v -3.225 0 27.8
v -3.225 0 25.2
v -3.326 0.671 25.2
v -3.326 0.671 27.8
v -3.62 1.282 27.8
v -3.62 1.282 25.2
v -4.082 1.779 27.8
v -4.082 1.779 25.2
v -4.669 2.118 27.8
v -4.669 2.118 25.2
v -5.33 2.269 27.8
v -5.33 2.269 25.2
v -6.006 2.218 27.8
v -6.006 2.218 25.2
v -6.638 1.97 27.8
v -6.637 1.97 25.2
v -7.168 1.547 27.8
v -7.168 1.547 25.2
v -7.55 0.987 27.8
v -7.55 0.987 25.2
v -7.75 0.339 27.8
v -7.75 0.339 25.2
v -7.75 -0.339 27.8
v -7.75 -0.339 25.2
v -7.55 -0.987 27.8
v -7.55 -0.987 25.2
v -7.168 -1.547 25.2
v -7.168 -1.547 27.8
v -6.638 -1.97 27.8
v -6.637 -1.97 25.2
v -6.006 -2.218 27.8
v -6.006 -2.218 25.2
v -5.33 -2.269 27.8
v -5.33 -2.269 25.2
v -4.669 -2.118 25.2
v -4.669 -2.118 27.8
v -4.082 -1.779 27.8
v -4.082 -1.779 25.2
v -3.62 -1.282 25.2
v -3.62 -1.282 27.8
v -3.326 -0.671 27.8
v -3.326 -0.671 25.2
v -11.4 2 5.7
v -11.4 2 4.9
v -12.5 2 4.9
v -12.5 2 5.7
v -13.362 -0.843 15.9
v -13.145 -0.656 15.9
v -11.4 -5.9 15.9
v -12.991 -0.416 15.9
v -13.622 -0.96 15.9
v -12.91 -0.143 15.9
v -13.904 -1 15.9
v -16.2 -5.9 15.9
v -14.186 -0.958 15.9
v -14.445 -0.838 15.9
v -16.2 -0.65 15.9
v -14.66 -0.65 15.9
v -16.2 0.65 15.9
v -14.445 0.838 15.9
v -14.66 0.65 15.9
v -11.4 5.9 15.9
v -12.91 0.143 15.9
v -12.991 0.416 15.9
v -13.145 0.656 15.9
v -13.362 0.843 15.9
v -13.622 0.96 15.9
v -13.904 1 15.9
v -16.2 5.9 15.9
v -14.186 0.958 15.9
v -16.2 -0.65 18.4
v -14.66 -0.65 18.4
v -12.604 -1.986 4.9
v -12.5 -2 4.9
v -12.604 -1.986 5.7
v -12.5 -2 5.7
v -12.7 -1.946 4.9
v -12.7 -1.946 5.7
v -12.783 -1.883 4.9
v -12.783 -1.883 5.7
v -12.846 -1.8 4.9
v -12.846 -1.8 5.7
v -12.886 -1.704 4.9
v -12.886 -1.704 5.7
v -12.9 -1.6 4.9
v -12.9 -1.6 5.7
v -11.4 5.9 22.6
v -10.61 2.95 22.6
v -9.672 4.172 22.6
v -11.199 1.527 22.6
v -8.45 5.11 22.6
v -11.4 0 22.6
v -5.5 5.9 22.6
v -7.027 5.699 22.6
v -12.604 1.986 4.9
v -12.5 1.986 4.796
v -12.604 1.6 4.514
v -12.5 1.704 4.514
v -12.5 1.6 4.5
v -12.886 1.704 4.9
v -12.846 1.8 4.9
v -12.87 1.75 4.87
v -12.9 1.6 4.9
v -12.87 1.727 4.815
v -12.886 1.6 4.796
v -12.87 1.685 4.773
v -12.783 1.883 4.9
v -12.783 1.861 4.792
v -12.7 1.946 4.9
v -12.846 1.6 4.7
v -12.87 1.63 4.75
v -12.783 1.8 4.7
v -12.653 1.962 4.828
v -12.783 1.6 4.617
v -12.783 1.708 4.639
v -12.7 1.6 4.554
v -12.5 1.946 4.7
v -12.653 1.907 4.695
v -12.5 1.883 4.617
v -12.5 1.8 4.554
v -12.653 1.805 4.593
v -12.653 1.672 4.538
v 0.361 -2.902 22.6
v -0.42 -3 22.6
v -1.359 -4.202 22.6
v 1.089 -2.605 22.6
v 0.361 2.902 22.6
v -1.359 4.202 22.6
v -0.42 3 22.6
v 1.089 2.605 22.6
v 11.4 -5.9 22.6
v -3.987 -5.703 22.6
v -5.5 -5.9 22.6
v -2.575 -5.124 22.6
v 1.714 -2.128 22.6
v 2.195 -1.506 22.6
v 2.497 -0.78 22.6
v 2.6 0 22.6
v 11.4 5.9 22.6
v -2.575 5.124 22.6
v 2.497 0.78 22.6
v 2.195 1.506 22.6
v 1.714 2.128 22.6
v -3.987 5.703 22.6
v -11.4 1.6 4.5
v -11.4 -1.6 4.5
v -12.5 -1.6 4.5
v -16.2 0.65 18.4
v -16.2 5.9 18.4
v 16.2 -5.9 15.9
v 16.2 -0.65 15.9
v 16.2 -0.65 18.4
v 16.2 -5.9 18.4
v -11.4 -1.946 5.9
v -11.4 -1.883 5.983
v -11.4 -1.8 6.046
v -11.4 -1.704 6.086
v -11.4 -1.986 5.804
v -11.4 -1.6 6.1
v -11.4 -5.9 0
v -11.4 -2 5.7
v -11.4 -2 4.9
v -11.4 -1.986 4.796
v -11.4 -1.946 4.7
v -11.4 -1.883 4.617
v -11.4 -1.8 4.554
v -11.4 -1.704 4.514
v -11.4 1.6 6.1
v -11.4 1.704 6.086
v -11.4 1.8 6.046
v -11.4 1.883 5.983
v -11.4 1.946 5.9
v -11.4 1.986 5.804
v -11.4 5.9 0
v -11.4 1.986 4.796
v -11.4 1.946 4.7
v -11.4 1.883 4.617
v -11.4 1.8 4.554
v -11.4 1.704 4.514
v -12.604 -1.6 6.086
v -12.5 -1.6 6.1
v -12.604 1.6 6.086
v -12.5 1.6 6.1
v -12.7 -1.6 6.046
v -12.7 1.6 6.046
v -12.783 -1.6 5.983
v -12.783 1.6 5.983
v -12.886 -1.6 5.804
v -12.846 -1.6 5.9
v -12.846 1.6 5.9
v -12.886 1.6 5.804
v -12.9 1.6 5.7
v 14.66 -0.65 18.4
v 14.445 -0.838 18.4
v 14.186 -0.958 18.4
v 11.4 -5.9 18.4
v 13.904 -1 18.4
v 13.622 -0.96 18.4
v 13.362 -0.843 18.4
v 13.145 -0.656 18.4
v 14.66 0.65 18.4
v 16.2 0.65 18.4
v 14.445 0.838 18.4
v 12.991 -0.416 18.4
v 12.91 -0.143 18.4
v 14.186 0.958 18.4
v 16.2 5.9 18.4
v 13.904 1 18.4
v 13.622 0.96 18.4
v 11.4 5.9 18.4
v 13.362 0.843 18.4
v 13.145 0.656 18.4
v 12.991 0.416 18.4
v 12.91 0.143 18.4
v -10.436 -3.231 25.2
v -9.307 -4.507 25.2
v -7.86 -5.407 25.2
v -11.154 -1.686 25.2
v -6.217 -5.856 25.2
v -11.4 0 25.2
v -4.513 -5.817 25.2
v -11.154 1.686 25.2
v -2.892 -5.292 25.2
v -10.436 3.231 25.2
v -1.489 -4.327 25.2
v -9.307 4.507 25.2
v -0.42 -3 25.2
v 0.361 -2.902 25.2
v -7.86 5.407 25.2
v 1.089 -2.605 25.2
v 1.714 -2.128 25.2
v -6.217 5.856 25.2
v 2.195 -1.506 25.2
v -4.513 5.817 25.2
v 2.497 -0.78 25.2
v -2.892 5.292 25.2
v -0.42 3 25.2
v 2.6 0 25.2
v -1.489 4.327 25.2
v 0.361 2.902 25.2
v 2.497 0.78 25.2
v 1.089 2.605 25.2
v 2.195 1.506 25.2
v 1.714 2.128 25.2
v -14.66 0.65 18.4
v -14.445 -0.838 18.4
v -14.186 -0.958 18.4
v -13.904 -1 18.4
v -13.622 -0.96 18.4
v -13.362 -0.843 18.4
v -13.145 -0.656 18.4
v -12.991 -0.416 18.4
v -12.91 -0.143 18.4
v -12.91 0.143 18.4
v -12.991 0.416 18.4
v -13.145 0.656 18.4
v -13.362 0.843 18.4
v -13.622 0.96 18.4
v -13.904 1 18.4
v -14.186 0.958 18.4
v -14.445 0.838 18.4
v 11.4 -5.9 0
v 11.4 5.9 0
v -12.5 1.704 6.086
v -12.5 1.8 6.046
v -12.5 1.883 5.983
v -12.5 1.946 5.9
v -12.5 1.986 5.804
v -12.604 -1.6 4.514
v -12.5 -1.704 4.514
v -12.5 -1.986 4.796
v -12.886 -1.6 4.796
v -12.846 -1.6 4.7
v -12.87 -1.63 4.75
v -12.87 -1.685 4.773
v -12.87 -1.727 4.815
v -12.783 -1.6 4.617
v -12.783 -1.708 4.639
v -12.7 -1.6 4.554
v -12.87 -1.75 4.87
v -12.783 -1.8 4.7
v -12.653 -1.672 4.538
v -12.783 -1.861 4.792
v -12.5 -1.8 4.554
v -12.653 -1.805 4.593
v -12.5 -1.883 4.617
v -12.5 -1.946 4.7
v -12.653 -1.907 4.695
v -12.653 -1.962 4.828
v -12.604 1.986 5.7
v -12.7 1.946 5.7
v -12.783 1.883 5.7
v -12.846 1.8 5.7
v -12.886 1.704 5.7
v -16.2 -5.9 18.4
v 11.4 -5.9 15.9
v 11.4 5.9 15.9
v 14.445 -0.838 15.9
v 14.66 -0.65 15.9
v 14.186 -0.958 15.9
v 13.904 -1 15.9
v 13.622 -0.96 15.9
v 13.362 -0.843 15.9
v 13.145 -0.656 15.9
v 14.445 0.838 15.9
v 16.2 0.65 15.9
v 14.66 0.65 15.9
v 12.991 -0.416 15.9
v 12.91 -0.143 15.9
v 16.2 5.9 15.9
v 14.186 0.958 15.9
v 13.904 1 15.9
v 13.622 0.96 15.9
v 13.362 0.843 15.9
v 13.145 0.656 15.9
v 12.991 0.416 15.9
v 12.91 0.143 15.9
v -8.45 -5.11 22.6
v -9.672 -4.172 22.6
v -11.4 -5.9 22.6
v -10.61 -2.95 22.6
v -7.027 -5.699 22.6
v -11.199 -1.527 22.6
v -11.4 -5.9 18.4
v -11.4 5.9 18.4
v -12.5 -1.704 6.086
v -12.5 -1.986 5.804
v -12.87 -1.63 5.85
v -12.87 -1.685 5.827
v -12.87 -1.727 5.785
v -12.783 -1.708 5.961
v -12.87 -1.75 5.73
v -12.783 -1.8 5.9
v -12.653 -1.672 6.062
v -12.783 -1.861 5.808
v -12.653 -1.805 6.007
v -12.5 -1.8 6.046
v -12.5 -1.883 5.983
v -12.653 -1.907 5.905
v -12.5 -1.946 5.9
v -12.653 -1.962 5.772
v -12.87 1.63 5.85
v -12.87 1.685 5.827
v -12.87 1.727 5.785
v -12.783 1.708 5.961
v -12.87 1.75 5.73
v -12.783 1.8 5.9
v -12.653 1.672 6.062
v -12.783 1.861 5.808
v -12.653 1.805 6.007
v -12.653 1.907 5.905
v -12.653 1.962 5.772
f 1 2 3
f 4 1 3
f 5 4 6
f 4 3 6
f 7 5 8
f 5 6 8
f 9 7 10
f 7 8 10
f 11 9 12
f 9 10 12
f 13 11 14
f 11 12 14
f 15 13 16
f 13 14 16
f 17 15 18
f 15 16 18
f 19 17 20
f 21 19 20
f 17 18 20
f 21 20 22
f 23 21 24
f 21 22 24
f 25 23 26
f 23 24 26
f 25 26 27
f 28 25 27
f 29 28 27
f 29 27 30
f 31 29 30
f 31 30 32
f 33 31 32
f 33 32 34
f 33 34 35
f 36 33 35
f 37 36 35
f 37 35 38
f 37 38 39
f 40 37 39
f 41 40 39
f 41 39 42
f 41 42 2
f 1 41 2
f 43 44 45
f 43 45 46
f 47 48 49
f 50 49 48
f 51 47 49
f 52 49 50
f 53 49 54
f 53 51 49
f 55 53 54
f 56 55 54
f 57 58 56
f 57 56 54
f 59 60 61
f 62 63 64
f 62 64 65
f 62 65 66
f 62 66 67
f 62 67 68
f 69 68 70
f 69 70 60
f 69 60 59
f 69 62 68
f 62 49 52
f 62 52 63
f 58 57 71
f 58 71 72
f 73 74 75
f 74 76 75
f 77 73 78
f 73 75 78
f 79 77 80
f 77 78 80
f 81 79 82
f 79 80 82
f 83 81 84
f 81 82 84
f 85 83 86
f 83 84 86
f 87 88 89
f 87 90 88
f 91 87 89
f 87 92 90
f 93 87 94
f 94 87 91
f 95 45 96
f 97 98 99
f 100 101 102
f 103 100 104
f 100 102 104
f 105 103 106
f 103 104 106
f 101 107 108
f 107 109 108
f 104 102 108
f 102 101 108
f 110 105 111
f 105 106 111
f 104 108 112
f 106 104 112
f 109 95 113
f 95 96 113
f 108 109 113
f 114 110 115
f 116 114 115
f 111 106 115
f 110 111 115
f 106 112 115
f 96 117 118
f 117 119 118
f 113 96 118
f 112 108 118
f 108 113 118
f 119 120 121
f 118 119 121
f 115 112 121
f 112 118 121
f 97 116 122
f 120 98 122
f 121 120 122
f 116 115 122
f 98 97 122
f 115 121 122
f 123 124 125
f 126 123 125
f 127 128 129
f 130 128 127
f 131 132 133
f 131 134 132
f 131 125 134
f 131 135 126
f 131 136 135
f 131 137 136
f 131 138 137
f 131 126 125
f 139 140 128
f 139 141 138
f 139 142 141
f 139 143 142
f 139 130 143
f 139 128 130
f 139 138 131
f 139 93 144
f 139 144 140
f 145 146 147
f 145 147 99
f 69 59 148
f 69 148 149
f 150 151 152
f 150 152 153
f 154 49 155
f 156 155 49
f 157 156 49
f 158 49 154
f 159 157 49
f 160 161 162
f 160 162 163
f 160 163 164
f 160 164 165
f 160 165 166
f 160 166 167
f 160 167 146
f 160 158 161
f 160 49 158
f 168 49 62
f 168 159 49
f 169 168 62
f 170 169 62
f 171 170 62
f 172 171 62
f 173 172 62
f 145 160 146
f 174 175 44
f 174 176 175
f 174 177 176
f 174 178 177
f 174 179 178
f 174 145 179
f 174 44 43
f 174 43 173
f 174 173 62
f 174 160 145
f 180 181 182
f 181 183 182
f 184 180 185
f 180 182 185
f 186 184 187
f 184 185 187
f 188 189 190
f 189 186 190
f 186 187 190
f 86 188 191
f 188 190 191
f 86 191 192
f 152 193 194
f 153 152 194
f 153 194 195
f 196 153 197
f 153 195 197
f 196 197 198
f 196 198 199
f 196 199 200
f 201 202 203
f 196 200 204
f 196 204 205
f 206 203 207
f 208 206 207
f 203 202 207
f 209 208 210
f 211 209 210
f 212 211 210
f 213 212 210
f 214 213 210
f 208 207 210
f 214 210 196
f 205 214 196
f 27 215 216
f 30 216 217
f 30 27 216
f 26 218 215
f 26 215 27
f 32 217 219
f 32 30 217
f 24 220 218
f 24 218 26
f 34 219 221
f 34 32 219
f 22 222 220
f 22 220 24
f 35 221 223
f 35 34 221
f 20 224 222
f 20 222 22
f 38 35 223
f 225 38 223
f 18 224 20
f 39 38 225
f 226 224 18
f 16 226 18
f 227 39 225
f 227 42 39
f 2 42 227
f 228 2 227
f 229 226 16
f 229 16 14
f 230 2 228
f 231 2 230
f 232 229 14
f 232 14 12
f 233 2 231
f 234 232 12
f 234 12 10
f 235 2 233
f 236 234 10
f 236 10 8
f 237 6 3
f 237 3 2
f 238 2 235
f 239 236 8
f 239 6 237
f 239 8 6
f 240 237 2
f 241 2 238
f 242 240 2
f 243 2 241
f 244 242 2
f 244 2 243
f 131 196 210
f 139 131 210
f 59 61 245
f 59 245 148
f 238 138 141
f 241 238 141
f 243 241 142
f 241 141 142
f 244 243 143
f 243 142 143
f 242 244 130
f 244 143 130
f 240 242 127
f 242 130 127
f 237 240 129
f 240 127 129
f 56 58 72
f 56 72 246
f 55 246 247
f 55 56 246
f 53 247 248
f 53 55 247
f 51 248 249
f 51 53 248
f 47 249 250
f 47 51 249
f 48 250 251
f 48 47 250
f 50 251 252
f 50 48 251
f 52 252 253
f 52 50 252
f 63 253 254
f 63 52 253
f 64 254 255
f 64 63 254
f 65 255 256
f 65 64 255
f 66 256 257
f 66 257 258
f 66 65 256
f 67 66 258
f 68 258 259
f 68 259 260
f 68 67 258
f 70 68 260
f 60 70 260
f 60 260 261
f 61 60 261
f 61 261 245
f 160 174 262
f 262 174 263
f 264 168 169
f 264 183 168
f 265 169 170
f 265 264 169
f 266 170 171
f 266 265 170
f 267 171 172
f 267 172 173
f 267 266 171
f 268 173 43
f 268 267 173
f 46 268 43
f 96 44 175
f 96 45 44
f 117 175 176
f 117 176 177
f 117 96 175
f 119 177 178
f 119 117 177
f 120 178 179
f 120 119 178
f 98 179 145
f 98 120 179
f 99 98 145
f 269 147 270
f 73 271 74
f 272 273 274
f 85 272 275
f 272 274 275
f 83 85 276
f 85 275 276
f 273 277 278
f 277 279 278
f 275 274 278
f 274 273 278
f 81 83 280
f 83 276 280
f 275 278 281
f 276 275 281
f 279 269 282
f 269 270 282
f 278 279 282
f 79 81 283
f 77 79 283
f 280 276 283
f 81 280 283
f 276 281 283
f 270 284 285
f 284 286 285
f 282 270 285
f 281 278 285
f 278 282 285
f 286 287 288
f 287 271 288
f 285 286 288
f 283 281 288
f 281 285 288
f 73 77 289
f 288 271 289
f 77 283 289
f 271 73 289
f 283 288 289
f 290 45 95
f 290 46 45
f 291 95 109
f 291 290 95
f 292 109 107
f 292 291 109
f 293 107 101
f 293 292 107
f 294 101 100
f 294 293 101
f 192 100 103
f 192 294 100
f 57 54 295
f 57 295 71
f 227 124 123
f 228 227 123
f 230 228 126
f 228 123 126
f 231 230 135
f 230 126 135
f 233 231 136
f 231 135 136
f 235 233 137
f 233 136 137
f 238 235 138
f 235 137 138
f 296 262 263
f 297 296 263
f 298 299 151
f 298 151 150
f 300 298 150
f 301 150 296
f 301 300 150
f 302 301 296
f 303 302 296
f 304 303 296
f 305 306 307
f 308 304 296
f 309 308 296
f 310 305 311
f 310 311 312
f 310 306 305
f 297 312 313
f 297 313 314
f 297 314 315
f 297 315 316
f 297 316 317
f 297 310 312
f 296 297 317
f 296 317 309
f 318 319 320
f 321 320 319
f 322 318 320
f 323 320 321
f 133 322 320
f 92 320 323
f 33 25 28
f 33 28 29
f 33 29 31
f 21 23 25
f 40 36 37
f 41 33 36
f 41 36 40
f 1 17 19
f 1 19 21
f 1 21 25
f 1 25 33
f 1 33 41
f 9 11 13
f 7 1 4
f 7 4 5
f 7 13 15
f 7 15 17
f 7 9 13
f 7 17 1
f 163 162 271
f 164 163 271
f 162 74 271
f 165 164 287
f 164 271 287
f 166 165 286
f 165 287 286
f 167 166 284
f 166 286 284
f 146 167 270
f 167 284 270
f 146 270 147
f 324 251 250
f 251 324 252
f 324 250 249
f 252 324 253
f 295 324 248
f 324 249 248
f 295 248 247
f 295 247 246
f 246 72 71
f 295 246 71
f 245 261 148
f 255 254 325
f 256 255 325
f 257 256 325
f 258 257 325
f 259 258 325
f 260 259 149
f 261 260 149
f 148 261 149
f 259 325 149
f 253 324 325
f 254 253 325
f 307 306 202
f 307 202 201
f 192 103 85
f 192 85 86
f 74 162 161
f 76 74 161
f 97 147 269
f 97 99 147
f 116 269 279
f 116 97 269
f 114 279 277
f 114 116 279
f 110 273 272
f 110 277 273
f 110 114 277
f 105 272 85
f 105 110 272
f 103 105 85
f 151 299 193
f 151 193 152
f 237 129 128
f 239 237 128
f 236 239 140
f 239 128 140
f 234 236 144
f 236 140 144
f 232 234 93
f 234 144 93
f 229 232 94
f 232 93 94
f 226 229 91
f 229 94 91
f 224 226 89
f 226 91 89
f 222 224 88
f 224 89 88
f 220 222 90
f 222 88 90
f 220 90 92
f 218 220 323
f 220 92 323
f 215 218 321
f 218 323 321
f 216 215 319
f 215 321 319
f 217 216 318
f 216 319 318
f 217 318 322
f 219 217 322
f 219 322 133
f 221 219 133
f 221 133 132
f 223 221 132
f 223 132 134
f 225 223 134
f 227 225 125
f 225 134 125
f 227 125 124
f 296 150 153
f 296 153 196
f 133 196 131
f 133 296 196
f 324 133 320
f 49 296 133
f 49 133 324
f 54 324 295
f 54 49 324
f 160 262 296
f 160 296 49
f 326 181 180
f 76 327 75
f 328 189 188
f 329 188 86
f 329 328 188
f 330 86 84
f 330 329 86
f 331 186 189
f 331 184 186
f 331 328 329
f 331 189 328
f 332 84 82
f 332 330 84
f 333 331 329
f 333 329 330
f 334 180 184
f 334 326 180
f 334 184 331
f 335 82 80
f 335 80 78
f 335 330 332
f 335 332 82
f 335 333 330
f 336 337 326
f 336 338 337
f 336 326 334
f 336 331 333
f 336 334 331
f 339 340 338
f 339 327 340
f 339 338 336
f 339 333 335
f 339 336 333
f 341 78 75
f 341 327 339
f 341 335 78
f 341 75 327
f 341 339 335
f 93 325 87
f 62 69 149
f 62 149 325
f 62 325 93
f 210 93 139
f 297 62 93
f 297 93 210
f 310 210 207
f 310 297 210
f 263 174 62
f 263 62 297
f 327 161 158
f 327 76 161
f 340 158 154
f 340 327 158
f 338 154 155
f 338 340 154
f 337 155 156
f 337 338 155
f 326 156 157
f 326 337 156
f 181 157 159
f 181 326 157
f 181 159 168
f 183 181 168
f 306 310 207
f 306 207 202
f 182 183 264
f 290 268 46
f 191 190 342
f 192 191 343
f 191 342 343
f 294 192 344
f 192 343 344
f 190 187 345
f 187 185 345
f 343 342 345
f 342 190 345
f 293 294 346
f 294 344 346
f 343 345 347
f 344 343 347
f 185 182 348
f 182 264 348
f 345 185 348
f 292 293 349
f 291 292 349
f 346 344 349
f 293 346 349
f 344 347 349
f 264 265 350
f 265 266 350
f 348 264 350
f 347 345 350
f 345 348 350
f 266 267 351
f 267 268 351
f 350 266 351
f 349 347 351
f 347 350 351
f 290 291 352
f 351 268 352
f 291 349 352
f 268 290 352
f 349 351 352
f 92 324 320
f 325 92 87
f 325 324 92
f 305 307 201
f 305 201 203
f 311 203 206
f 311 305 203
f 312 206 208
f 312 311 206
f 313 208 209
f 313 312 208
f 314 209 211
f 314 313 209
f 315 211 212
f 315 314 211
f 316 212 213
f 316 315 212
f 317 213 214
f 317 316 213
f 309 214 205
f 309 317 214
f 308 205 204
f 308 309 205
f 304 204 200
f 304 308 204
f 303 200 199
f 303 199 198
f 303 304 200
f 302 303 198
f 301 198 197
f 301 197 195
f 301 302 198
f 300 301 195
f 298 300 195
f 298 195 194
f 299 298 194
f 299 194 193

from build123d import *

# Parameters (mm, degrees)
SKETCH_1_W      = 22.8
SKETCH_1_H      = 11.8
EXTRUDE_1_DEPTH = 22.6
SKETCH_2_R      = 5.9
EXTRUDE_2_DEPTH = 2.6
SKETCH_3_R      = 2.275
EXTRUDE_3_DEPTH = 2.6
EXTRUDE_4_DEPTH = 2.6
EXTRUDE_5_DEPTH = 2.5
SKETCH_6_W      = 1.6
SKETCH_6_H      = 4
EXTRUDE_6_DEPTH = 1.5
FILLET_1_R      = 0.4


with BuildPart() as part:
    # Эскиз1 → Бобышка-Вытянуть1 (new body)
    with BuildSketch(Plane.XY):
        Rectangle(SKETCH_1_W, SKETCH_1_H)
    extrude(amount=EXTRUDE_1_DEPTH)

    # Эскиз2 → Бобышка-Вытянуть2 (add)
    with BuildSketch(Plane.XY.offset(22.6)):
        with Locations((-5.5, 0)):
            Circle(SKETCH_2_R)
    extrude(amount=EXTRUDE_2_DEPTH)

    # Эскиз3 → Бобышка-Вытянуть3 (add)
    with BuildSketch(Plane.XY.offset(25.2)):
        with Locations((-5.5, 0)):
            Circle(SKETCH_3_R)
    extrude(amount=EXTRUDE_3_DEPTH)

    # Эскиз4 → Бобышка-Вытянуть4 (add)
    with BuildSketch(Plane.XY.offset(22.6)):
        with BuildLine():
            ThreePointArc((-0.419607843, 2.999935921), (-3.4, 0), (-0.419607843, -2.999935921))
            ThreePointArc((-0.419607843, -2.999935921), (0.4, 0), (-0.419607843, 2.999935921))
        make_face()
        with BuildLine():
            ThreePointArc((-0.419607843, 2.999935921), (0.4, 0), (-0.419607843, -2.999935921))
            ThreePointArc((-0.419607843, -2.999935921), (1.714376559, -2.128241472), (2.6, 0))
            ThreePointArc((2.6, 0), (1.714376559, 2.128241472), (-0.419607843, 2.999935921))
        make_face()
    extrude(amount=EXTRUDE_4_DEPTH)

    # Эскиз5 → Бобышка-Вытянуть5 (add)
    with BuildSketch(Plane(origin=(0, 0, 15.9), x_dir=(-1, 0, 0), z_dir=(0, 0, -1))):
        with BuildLine():
            Line((16.2, 5.9), (-16.2, 5.9))
            Line((-16.2, 5.9), (-16.2, 0.65))
            Line((-16.2, 0.65), (-14.659934208, 0.65))
            ThreePointArc((-14.659934208, 0.65), (-12.9, 0), (-14.659934208, -0.65))
            Line((-14.659934208, -0.65), (-16.2, -0.65))
            Line((-16.2, -0.65), (-16.2, -5.9))
            Line((-16.2, -5.9), (16.2, -5.9))
            Line((16.2, -5.9), (16.2, -0.65))
            Line((16.2, -0.65), (14.659934208, -0.65))
            ThreePointArc((14.659934208, -0.65), (12.9, 0), (14.659934208, 0.65))
            Line((14.659934208, 0.65), (16.2, 0.65))
            Line((16.2, 0.65), (16.2, 5.9))
        make_face()
    extrude(amount=-EXTRUDE_5_DEPTH)

    # Эскиз6 → Бобышка-Вытянуть6 (add)
    with BuildSketch(Plane.ZY.offset(11.4)):
        with Locations((5.3, 0)):
            Rectangle(SKETCH_6_W, SKETCH_6_H)
    extrude(amount=EXTRUDE_6_DEPTH)

    # Скругление1
    fillet_1_edges = [part.edges().sort_by_distance(p)[0] for p in [
        (-12.15, -2, 6.1),
        (-12.15, 2, 6.1),
        (-12.15, 2, 4.5),
        (-12.15, -2, 4.5),
        (-12.9, 0, 6.1),
        (-12.9, 2, 5.3),
        (-12.9, 0, 4.5),
        (-12.9, -2, 5.3),
    ]]
    fillet(fillet_1_edges, radius=FILLET_1_R)


solid = part.part
